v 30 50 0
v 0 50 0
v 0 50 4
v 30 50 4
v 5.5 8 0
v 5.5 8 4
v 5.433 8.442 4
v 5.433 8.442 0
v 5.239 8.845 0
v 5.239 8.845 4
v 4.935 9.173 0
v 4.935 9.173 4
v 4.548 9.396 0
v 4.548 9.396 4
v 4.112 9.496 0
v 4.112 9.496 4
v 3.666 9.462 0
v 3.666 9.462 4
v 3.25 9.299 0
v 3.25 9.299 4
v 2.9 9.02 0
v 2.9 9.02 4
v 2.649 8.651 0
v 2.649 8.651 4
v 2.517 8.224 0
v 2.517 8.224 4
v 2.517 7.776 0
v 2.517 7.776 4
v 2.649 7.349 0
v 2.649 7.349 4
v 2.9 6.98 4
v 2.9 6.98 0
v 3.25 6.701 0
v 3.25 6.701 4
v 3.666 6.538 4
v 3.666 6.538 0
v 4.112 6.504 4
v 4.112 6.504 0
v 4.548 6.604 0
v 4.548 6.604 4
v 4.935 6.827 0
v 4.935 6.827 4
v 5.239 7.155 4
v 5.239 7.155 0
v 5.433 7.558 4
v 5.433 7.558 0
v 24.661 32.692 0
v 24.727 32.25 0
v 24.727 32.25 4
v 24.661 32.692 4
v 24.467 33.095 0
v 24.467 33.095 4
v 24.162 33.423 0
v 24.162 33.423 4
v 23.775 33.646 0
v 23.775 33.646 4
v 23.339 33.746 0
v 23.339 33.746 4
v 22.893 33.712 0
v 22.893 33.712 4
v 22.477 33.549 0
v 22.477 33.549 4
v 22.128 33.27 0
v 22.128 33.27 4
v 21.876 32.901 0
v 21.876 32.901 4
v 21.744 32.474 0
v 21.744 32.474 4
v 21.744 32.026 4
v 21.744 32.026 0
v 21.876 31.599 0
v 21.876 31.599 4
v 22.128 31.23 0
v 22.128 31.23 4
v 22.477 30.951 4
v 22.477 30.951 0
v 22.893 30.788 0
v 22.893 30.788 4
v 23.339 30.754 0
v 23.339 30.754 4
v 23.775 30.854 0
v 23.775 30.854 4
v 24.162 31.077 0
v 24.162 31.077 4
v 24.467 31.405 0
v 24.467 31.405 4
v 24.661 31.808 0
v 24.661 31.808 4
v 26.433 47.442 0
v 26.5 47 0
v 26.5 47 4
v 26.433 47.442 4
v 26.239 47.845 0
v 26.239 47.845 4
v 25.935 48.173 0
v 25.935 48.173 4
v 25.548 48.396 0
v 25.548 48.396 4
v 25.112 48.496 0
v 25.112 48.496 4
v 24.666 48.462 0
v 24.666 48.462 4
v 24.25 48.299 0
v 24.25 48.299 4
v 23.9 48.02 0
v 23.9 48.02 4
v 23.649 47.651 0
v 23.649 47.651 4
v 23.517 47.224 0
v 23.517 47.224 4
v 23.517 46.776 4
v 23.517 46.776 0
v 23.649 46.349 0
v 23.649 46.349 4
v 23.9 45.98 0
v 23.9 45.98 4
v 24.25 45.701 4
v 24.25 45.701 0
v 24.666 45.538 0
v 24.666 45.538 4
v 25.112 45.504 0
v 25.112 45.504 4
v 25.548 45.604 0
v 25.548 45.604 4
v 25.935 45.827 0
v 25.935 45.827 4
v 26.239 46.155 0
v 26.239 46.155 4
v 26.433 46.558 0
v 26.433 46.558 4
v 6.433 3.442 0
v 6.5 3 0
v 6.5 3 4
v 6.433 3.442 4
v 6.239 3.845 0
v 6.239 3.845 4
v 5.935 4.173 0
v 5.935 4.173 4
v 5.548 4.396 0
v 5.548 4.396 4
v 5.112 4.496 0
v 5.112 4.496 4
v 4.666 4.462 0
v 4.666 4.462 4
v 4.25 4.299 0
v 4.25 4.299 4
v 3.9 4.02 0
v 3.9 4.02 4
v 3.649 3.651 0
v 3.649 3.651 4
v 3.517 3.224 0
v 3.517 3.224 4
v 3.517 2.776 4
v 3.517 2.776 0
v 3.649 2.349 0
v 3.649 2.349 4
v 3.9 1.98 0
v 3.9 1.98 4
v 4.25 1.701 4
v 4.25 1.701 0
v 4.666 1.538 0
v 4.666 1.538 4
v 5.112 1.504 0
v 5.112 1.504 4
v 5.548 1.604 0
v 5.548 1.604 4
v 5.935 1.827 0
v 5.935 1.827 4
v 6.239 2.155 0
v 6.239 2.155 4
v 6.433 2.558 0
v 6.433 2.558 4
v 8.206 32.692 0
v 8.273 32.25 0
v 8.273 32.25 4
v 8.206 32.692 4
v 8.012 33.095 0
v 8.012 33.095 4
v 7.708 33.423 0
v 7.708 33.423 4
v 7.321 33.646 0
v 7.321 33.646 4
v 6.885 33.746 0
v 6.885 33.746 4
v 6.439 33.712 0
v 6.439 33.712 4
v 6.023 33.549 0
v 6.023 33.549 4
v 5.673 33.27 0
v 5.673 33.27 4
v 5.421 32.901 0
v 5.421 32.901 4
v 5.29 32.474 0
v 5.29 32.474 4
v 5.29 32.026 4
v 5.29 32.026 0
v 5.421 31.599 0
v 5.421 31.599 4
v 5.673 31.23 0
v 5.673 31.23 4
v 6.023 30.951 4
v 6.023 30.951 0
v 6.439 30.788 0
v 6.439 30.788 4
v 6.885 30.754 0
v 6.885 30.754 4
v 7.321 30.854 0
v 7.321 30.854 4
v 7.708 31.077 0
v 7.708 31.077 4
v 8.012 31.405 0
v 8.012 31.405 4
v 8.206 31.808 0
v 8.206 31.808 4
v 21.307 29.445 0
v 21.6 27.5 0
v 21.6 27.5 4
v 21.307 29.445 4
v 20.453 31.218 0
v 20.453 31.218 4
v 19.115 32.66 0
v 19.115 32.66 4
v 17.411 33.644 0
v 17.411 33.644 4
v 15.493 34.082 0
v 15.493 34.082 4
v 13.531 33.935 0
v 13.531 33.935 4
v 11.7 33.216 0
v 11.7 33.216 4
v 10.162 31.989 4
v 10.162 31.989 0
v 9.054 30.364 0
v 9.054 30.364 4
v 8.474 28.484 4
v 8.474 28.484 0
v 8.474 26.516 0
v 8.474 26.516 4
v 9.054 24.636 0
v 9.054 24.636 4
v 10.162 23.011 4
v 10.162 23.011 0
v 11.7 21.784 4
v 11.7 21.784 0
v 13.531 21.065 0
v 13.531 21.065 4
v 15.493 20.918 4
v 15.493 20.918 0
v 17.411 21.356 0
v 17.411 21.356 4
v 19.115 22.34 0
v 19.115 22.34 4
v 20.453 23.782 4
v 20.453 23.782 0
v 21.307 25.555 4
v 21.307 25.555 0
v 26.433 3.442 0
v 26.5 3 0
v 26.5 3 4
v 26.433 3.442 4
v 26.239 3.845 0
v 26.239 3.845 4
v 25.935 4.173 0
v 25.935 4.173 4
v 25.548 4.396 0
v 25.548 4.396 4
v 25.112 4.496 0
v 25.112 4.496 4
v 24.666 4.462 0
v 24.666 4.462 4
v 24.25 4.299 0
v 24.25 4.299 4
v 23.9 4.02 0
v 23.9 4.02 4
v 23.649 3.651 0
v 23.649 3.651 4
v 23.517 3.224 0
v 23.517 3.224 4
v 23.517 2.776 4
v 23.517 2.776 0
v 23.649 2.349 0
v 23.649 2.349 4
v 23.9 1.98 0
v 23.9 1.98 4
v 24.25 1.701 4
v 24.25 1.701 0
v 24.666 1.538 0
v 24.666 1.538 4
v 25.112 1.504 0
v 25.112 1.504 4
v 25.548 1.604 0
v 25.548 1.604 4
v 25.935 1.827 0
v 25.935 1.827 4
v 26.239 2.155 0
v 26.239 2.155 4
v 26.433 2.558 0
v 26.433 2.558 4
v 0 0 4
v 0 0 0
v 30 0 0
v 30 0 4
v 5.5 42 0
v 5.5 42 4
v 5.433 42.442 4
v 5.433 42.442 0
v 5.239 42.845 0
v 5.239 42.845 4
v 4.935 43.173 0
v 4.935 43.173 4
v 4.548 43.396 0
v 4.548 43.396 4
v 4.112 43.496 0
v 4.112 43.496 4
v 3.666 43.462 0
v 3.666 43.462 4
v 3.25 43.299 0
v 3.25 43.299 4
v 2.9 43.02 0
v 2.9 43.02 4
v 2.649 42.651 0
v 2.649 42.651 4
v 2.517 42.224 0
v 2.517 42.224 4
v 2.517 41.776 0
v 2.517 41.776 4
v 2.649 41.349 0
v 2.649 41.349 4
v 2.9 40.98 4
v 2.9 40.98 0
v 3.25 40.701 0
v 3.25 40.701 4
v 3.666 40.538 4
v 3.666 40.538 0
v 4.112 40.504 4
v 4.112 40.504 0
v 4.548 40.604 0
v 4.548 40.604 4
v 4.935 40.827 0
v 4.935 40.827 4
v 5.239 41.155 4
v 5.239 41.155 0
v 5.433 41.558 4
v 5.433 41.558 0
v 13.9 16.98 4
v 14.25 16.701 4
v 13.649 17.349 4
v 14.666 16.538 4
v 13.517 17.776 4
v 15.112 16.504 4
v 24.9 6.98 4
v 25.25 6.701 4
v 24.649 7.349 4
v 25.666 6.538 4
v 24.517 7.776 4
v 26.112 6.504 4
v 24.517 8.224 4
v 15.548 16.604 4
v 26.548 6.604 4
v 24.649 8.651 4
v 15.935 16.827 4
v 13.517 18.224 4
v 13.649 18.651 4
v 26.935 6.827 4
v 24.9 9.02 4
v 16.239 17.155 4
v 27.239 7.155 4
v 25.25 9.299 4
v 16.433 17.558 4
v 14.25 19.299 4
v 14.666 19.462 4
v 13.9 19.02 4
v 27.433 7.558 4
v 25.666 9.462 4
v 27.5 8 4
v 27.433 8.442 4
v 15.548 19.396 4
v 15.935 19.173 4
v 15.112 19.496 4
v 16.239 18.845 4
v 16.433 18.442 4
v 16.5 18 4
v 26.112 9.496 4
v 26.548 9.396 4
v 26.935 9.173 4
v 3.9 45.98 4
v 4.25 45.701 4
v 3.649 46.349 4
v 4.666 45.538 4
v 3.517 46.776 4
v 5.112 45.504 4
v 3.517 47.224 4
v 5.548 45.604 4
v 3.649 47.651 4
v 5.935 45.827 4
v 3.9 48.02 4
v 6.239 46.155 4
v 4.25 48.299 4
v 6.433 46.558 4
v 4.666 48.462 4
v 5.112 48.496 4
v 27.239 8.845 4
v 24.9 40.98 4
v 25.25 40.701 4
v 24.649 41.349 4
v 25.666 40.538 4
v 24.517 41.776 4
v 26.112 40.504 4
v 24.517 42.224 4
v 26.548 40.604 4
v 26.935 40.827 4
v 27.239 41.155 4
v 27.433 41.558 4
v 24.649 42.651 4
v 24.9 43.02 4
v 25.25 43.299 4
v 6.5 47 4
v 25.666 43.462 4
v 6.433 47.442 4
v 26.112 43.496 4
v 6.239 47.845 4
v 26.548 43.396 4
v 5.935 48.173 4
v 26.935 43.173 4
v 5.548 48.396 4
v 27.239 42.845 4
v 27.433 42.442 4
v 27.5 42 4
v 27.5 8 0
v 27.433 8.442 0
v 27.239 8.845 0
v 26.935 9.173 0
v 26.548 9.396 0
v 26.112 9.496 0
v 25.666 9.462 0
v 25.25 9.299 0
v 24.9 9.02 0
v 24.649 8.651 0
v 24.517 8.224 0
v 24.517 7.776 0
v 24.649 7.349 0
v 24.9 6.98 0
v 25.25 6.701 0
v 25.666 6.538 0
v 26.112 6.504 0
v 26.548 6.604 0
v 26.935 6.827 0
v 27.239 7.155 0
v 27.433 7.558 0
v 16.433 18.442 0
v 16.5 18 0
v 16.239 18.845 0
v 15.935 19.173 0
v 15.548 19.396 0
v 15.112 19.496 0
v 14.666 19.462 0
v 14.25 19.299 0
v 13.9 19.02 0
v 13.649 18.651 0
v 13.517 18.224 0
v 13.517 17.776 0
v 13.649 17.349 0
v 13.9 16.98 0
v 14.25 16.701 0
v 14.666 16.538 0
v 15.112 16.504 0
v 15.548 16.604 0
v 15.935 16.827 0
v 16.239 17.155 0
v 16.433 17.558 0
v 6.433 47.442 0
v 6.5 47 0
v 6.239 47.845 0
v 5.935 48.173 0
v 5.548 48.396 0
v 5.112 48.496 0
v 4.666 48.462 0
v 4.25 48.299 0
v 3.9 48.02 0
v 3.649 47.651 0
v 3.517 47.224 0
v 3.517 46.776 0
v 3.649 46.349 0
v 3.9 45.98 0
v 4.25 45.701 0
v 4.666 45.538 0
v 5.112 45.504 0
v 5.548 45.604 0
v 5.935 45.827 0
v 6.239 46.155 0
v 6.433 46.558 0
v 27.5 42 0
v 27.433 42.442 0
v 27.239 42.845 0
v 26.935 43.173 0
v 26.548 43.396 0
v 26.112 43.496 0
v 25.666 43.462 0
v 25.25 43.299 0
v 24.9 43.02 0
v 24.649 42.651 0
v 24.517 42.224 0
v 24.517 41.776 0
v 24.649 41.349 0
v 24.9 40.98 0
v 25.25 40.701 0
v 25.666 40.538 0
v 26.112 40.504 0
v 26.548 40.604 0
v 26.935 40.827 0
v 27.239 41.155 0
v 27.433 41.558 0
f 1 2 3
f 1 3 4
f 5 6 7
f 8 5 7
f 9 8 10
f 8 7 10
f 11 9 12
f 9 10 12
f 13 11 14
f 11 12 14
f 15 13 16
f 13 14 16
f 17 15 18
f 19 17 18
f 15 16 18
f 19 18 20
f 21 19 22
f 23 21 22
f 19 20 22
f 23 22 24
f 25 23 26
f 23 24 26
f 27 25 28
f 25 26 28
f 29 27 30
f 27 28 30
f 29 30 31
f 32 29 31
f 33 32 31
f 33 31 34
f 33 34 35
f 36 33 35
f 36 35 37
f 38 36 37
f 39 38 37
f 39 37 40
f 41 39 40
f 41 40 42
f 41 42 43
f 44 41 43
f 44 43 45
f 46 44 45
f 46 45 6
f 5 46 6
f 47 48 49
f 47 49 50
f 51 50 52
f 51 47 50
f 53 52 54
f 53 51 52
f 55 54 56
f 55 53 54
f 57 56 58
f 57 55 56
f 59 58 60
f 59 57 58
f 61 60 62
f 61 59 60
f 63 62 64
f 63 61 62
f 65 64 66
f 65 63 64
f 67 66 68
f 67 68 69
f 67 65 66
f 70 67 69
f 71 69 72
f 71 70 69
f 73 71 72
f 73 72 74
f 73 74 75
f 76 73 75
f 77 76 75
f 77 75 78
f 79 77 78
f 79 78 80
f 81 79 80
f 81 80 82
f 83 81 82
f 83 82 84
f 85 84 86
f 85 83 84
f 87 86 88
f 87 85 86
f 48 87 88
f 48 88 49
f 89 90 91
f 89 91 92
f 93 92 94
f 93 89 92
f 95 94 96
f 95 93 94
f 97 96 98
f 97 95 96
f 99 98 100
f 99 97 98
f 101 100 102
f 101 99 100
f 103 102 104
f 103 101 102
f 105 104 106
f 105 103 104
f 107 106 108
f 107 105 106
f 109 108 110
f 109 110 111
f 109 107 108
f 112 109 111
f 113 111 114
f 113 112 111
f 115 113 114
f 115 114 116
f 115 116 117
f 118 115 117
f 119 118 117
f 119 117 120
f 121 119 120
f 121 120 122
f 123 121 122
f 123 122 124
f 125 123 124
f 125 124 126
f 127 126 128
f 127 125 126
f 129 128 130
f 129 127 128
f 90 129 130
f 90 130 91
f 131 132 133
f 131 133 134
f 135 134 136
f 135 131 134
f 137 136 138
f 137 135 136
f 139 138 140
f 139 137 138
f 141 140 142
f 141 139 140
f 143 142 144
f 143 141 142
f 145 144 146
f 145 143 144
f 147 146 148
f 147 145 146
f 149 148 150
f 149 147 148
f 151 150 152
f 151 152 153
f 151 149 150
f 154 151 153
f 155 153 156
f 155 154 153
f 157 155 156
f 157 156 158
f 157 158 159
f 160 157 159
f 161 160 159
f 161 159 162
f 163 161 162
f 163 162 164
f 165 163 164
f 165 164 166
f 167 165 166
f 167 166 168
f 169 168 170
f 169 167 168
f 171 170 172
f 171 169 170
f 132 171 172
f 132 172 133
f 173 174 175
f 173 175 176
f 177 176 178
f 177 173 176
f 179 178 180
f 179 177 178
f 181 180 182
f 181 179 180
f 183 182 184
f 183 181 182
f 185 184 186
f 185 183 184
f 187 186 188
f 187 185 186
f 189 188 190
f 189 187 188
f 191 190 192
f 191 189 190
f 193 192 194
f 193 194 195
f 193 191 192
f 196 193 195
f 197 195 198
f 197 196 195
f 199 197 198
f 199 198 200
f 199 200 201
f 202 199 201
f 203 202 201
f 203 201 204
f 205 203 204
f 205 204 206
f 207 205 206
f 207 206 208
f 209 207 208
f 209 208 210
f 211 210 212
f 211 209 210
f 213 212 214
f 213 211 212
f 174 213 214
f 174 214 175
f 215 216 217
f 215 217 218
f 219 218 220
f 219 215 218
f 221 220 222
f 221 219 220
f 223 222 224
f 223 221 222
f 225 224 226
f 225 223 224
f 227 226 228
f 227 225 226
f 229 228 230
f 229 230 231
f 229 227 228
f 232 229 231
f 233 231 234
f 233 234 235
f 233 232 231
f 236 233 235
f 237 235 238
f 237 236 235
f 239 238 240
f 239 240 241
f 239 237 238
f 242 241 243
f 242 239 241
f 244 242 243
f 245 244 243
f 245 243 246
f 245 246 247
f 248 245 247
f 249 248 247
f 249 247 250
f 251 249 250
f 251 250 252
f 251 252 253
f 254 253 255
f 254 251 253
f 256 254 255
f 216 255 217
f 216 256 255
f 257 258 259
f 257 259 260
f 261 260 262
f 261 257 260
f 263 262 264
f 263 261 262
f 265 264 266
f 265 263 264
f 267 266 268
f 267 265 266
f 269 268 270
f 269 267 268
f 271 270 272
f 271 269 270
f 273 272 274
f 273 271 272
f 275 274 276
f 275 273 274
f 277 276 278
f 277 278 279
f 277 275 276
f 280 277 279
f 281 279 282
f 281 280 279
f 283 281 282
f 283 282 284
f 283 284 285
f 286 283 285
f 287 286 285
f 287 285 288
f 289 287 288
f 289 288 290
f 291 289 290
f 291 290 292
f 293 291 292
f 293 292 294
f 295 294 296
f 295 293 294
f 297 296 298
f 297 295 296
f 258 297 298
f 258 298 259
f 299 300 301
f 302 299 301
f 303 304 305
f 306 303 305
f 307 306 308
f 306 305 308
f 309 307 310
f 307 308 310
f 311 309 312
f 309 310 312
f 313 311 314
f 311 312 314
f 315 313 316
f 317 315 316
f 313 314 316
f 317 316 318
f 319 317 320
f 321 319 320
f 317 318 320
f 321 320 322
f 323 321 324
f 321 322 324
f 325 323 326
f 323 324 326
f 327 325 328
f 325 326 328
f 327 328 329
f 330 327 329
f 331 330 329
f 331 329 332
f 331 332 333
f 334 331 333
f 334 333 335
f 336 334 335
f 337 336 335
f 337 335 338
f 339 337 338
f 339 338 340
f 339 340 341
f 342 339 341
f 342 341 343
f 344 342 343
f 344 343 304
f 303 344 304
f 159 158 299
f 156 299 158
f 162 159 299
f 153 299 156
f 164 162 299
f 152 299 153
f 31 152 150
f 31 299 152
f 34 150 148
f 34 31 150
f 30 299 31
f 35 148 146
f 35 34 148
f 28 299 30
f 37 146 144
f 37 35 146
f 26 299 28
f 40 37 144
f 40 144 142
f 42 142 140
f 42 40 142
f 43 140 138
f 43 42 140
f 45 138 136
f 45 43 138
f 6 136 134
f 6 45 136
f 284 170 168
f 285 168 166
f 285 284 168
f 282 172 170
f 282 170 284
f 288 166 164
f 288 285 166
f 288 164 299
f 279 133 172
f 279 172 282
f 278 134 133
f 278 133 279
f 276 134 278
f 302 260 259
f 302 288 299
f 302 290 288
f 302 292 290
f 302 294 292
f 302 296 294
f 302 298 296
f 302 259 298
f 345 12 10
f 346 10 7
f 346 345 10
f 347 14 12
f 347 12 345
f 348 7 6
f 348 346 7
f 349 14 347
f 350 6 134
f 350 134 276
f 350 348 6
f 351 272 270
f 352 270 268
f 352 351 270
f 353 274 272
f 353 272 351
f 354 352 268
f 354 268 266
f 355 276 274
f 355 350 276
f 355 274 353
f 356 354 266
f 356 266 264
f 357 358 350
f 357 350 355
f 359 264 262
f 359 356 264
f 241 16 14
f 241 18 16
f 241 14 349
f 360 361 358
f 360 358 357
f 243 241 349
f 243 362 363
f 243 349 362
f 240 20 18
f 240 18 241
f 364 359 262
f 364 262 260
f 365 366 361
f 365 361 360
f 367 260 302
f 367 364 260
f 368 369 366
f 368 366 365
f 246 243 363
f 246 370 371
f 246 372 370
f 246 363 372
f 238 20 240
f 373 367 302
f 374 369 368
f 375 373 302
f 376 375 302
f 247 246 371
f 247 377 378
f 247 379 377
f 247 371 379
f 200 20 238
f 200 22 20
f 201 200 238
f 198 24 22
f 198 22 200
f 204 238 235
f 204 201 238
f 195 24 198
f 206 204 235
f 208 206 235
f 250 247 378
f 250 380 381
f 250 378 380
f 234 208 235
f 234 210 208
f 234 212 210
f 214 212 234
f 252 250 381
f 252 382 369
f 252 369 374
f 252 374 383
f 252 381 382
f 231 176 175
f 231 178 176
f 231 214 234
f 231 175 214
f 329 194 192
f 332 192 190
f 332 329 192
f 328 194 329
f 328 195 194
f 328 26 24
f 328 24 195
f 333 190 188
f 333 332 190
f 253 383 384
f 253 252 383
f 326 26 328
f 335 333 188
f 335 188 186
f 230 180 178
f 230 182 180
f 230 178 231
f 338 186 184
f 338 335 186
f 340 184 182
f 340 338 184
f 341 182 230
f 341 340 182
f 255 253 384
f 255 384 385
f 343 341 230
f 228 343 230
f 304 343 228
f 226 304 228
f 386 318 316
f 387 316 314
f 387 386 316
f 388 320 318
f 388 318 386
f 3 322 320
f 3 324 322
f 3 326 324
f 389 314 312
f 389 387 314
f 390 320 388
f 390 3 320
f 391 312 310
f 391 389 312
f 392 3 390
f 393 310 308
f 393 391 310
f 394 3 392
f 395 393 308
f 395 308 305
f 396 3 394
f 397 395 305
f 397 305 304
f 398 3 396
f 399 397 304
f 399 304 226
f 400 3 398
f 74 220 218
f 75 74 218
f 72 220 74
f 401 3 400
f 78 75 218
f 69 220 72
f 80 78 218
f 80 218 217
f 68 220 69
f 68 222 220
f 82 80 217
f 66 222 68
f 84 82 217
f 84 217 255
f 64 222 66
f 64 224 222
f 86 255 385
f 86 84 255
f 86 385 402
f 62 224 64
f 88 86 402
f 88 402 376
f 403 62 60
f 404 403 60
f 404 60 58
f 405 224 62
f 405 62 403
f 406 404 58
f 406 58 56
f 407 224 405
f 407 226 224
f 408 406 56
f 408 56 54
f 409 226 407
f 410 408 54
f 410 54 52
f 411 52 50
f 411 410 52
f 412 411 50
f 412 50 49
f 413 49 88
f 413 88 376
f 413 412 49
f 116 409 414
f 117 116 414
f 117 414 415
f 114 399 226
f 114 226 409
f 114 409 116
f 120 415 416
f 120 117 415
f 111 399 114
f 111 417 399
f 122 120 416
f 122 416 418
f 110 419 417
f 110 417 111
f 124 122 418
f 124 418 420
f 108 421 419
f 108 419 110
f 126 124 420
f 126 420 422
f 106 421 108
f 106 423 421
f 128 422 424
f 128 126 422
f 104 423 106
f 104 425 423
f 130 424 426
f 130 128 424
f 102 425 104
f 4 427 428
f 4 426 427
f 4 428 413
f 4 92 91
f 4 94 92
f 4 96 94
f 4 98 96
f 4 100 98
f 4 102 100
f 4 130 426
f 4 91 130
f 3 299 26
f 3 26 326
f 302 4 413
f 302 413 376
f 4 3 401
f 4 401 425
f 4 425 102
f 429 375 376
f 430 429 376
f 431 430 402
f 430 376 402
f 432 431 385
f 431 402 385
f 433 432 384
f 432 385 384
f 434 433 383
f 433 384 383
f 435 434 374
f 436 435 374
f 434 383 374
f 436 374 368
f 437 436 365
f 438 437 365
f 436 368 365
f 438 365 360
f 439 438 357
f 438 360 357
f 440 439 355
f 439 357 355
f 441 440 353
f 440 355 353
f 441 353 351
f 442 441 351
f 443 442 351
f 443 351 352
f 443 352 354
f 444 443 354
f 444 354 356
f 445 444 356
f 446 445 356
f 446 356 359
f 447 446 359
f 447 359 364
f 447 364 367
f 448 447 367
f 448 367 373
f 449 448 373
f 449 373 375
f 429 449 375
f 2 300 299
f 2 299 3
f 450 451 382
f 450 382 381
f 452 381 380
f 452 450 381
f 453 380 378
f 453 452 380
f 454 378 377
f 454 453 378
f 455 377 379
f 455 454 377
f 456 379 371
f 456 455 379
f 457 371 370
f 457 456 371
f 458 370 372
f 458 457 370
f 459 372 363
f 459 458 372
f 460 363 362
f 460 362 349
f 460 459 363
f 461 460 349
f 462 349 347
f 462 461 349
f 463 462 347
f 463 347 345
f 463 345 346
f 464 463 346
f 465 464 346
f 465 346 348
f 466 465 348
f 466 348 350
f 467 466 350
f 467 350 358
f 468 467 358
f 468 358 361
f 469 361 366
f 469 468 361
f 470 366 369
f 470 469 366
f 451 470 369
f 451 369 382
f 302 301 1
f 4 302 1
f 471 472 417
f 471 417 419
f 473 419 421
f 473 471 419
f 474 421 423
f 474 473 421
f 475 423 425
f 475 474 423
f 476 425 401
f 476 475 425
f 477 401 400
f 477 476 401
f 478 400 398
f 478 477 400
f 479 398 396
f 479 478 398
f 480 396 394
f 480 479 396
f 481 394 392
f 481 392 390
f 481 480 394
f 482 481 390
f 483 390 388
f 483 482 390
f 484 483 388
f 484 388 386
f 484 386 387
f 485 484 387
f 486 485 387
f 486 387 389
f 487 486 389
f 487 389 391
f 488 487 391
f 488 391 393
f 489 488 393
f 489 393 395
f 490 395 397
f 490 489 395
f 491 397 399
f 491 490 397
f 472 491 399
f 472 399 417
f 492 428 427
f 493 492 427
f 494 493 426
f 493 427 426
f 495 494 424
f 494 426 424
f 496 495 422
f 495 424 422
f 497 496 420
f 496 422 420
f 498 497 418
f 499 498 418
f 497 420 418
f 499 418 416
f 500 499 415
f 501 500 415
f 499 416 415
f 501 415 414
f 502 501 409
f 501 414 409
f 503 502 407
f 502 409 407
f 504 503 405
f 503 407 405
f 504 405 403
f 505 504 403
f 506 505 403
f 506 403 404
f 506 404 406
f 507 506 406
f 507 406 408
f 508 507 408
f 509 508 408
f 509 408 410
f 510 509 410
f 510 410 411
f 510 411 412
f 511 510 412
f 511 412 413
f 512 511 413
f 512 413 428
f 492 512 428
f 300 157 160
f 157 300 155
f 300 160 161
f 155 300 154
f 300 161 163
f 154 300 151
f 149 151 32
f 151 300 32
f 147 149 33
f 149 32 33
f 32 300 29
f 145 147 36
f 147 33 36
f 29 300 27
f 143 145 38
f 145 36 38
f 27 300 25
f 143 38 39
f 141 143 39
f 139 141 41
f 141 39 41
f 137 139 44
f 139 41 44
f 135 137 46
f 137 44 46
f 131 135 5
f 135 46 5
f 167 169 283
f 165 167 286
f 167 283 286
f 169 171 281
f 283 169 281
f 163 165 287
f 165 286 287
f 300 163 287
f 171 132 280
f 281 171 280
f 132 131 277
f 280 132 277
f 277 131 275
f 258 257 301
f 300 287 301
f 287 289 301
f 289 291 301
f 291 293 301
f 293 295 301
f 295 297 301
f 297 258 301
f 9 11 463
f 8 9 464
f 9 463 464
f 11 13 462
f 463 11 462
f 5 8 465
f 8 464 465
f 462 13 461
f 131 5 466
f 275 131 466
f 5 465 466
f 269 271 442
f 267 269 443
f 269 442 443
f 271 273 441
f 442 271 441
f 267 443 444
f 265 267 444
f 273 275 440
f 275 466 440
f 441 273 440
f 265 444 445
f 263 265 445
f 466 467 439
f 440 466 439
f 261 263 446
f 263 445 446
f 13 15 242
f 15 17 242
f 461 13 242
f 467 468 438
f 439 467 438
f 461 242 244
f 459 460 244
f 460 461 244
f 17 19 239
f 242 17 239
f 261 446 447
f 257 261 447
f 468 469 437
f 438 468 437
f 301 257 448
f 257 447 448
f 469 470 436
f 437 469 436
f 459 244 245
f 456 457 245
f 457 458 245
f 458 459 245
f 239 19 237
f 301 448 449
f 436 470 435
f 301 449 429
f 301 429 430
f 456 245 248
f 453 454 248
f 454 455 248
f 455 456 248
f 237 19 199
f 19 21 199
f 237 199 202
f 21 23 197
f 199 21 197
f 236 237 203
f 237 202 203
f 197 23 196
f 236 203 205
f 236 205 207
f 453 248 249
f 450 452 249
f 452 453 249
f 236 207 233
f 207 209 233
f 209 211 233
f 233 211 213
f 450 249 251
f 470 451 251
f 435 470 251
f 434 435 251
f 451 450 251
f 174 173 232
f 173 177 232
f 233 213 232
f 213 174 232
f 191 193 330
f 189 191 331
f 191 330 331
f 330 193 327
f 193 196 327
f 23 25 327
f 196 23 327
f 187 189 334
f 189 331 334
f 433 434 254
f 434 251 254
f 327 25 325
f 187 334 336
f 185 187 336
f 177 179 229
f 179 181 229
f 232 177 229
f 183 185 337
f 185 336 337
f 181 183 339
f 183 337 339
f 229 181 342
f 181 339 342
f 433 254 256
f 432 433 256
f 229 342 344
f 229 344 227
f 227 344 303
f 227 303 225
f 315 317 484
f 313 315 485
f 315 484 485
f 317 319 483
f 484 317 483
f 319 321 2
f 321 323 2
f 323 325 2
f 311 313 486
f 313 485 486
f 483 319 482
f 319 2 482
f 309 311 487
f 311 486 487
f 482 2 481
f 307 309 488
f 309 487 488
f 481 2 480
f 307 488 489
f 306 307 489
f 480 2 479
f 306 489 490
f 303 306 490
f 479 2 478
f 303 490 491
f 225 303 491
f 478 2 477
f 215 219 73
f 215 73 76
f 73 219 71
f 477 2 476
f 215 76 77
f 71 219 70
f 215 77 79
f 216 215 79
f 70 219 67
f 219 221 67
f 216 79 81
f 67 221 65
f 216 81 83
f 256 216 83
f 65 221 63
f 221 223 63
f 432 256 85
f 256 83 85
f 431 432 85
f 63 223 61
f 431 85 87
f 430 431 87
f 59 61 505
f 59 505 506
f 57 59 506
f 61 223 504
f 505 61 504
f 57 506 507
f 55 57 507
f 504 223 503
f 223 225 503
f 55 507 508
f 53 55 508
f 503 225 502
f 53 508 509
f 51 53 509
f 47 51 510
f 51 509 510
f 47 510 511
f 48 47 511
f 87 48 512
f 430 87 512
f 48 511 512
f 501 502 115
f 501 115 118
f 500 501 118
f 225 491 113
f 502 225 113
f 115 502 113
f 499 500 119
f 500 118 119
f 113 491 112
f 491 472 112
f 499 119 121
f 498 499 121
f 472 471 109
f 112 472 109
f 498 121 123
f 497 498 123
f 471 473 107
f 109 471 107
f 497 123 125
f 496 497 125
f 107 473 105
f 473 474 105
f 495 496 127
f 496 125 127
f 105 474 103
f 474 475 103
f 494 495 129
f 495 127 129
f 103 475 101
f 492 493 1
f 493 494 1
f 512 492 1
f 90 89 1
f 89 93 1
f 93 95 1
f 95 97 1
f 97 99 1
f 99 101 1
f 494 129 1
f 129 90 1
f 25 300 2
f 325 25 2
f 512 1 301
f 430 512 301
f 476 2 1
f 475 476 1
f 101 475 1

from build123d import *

# Parameters (mm, degrees)
SKETCH_1_W          = 30
SKETCH_1_H          = 50
SKETCH_1_R          = 6.6
SKETCH_1_R_2        = 1.5
EXTRUDE_1_DEPTH     = 4
SKETCH_2_R          = 1.5
CUT_EXTRUDE_1_DEPTH = 59.446556785


with BuildPart() as part:
    # 草图1 → 凸台-拉伸1 (new body)
    with BuildSketch(Plane.XY):
        with Locations((15, 25)):
            Rectangle(SKETCH_1_W, SKETCH_1_H)
        with Locations((15, 27.5)):
            Circle(SKETCH_1_R, mode=Mode.SUBTRACT)
        with Locations((23.227241336, 32.25)):
            Circle(SKETCH_1_R_2, mode=Mode.SUBTRACT)
        with Locations((15, 18)):
            Circle(SKETCH_1_R_2, mode=Mode.SUBTRACT)
        with Locations((6.772758664, 32.25)):
            Circle(SKETCH_1_R_2, mode=Mode.SUBTRACT)
        with Locations((5, 47)):
            Circle(SKETCH_1_R_2, mode=Mode.SUBTRACT)
        with Locations((25, 47)):
            Circle(SKETCH_1_R_2, mode=Mode.SUBTRACT)
        with Locations((5, 3)):
            Circle(SKETCH_1_R_2, mode=Mode.SUBTRACT)
        with Locations((25, 3)):
            Circle(SKETCH_1_R_2, mode=Mode.SUBTRACT)
    extrude(amount=EXTRUDE_1_DEPTH)

    # 草图2 → 切除-拉伸1 (cut, through all)
    with BuildSketch(Plane.XY.offset(4)):
        with Locations((4, 42)):
            Circle(SKETCH_2_R)
        with Locations((26, 42)):
            Circle(SKETCH_2_R)
        with Locations((26, 8)):
            Circle(SKETCH_2_R)
        with Locations((4, 8)):
            Circle(SKETCH_2_R)
    extrude(amount=-CUT_EXTRUDE_1_DEPTH, mode=Mode.SUBTRACT)


solid = part.part
